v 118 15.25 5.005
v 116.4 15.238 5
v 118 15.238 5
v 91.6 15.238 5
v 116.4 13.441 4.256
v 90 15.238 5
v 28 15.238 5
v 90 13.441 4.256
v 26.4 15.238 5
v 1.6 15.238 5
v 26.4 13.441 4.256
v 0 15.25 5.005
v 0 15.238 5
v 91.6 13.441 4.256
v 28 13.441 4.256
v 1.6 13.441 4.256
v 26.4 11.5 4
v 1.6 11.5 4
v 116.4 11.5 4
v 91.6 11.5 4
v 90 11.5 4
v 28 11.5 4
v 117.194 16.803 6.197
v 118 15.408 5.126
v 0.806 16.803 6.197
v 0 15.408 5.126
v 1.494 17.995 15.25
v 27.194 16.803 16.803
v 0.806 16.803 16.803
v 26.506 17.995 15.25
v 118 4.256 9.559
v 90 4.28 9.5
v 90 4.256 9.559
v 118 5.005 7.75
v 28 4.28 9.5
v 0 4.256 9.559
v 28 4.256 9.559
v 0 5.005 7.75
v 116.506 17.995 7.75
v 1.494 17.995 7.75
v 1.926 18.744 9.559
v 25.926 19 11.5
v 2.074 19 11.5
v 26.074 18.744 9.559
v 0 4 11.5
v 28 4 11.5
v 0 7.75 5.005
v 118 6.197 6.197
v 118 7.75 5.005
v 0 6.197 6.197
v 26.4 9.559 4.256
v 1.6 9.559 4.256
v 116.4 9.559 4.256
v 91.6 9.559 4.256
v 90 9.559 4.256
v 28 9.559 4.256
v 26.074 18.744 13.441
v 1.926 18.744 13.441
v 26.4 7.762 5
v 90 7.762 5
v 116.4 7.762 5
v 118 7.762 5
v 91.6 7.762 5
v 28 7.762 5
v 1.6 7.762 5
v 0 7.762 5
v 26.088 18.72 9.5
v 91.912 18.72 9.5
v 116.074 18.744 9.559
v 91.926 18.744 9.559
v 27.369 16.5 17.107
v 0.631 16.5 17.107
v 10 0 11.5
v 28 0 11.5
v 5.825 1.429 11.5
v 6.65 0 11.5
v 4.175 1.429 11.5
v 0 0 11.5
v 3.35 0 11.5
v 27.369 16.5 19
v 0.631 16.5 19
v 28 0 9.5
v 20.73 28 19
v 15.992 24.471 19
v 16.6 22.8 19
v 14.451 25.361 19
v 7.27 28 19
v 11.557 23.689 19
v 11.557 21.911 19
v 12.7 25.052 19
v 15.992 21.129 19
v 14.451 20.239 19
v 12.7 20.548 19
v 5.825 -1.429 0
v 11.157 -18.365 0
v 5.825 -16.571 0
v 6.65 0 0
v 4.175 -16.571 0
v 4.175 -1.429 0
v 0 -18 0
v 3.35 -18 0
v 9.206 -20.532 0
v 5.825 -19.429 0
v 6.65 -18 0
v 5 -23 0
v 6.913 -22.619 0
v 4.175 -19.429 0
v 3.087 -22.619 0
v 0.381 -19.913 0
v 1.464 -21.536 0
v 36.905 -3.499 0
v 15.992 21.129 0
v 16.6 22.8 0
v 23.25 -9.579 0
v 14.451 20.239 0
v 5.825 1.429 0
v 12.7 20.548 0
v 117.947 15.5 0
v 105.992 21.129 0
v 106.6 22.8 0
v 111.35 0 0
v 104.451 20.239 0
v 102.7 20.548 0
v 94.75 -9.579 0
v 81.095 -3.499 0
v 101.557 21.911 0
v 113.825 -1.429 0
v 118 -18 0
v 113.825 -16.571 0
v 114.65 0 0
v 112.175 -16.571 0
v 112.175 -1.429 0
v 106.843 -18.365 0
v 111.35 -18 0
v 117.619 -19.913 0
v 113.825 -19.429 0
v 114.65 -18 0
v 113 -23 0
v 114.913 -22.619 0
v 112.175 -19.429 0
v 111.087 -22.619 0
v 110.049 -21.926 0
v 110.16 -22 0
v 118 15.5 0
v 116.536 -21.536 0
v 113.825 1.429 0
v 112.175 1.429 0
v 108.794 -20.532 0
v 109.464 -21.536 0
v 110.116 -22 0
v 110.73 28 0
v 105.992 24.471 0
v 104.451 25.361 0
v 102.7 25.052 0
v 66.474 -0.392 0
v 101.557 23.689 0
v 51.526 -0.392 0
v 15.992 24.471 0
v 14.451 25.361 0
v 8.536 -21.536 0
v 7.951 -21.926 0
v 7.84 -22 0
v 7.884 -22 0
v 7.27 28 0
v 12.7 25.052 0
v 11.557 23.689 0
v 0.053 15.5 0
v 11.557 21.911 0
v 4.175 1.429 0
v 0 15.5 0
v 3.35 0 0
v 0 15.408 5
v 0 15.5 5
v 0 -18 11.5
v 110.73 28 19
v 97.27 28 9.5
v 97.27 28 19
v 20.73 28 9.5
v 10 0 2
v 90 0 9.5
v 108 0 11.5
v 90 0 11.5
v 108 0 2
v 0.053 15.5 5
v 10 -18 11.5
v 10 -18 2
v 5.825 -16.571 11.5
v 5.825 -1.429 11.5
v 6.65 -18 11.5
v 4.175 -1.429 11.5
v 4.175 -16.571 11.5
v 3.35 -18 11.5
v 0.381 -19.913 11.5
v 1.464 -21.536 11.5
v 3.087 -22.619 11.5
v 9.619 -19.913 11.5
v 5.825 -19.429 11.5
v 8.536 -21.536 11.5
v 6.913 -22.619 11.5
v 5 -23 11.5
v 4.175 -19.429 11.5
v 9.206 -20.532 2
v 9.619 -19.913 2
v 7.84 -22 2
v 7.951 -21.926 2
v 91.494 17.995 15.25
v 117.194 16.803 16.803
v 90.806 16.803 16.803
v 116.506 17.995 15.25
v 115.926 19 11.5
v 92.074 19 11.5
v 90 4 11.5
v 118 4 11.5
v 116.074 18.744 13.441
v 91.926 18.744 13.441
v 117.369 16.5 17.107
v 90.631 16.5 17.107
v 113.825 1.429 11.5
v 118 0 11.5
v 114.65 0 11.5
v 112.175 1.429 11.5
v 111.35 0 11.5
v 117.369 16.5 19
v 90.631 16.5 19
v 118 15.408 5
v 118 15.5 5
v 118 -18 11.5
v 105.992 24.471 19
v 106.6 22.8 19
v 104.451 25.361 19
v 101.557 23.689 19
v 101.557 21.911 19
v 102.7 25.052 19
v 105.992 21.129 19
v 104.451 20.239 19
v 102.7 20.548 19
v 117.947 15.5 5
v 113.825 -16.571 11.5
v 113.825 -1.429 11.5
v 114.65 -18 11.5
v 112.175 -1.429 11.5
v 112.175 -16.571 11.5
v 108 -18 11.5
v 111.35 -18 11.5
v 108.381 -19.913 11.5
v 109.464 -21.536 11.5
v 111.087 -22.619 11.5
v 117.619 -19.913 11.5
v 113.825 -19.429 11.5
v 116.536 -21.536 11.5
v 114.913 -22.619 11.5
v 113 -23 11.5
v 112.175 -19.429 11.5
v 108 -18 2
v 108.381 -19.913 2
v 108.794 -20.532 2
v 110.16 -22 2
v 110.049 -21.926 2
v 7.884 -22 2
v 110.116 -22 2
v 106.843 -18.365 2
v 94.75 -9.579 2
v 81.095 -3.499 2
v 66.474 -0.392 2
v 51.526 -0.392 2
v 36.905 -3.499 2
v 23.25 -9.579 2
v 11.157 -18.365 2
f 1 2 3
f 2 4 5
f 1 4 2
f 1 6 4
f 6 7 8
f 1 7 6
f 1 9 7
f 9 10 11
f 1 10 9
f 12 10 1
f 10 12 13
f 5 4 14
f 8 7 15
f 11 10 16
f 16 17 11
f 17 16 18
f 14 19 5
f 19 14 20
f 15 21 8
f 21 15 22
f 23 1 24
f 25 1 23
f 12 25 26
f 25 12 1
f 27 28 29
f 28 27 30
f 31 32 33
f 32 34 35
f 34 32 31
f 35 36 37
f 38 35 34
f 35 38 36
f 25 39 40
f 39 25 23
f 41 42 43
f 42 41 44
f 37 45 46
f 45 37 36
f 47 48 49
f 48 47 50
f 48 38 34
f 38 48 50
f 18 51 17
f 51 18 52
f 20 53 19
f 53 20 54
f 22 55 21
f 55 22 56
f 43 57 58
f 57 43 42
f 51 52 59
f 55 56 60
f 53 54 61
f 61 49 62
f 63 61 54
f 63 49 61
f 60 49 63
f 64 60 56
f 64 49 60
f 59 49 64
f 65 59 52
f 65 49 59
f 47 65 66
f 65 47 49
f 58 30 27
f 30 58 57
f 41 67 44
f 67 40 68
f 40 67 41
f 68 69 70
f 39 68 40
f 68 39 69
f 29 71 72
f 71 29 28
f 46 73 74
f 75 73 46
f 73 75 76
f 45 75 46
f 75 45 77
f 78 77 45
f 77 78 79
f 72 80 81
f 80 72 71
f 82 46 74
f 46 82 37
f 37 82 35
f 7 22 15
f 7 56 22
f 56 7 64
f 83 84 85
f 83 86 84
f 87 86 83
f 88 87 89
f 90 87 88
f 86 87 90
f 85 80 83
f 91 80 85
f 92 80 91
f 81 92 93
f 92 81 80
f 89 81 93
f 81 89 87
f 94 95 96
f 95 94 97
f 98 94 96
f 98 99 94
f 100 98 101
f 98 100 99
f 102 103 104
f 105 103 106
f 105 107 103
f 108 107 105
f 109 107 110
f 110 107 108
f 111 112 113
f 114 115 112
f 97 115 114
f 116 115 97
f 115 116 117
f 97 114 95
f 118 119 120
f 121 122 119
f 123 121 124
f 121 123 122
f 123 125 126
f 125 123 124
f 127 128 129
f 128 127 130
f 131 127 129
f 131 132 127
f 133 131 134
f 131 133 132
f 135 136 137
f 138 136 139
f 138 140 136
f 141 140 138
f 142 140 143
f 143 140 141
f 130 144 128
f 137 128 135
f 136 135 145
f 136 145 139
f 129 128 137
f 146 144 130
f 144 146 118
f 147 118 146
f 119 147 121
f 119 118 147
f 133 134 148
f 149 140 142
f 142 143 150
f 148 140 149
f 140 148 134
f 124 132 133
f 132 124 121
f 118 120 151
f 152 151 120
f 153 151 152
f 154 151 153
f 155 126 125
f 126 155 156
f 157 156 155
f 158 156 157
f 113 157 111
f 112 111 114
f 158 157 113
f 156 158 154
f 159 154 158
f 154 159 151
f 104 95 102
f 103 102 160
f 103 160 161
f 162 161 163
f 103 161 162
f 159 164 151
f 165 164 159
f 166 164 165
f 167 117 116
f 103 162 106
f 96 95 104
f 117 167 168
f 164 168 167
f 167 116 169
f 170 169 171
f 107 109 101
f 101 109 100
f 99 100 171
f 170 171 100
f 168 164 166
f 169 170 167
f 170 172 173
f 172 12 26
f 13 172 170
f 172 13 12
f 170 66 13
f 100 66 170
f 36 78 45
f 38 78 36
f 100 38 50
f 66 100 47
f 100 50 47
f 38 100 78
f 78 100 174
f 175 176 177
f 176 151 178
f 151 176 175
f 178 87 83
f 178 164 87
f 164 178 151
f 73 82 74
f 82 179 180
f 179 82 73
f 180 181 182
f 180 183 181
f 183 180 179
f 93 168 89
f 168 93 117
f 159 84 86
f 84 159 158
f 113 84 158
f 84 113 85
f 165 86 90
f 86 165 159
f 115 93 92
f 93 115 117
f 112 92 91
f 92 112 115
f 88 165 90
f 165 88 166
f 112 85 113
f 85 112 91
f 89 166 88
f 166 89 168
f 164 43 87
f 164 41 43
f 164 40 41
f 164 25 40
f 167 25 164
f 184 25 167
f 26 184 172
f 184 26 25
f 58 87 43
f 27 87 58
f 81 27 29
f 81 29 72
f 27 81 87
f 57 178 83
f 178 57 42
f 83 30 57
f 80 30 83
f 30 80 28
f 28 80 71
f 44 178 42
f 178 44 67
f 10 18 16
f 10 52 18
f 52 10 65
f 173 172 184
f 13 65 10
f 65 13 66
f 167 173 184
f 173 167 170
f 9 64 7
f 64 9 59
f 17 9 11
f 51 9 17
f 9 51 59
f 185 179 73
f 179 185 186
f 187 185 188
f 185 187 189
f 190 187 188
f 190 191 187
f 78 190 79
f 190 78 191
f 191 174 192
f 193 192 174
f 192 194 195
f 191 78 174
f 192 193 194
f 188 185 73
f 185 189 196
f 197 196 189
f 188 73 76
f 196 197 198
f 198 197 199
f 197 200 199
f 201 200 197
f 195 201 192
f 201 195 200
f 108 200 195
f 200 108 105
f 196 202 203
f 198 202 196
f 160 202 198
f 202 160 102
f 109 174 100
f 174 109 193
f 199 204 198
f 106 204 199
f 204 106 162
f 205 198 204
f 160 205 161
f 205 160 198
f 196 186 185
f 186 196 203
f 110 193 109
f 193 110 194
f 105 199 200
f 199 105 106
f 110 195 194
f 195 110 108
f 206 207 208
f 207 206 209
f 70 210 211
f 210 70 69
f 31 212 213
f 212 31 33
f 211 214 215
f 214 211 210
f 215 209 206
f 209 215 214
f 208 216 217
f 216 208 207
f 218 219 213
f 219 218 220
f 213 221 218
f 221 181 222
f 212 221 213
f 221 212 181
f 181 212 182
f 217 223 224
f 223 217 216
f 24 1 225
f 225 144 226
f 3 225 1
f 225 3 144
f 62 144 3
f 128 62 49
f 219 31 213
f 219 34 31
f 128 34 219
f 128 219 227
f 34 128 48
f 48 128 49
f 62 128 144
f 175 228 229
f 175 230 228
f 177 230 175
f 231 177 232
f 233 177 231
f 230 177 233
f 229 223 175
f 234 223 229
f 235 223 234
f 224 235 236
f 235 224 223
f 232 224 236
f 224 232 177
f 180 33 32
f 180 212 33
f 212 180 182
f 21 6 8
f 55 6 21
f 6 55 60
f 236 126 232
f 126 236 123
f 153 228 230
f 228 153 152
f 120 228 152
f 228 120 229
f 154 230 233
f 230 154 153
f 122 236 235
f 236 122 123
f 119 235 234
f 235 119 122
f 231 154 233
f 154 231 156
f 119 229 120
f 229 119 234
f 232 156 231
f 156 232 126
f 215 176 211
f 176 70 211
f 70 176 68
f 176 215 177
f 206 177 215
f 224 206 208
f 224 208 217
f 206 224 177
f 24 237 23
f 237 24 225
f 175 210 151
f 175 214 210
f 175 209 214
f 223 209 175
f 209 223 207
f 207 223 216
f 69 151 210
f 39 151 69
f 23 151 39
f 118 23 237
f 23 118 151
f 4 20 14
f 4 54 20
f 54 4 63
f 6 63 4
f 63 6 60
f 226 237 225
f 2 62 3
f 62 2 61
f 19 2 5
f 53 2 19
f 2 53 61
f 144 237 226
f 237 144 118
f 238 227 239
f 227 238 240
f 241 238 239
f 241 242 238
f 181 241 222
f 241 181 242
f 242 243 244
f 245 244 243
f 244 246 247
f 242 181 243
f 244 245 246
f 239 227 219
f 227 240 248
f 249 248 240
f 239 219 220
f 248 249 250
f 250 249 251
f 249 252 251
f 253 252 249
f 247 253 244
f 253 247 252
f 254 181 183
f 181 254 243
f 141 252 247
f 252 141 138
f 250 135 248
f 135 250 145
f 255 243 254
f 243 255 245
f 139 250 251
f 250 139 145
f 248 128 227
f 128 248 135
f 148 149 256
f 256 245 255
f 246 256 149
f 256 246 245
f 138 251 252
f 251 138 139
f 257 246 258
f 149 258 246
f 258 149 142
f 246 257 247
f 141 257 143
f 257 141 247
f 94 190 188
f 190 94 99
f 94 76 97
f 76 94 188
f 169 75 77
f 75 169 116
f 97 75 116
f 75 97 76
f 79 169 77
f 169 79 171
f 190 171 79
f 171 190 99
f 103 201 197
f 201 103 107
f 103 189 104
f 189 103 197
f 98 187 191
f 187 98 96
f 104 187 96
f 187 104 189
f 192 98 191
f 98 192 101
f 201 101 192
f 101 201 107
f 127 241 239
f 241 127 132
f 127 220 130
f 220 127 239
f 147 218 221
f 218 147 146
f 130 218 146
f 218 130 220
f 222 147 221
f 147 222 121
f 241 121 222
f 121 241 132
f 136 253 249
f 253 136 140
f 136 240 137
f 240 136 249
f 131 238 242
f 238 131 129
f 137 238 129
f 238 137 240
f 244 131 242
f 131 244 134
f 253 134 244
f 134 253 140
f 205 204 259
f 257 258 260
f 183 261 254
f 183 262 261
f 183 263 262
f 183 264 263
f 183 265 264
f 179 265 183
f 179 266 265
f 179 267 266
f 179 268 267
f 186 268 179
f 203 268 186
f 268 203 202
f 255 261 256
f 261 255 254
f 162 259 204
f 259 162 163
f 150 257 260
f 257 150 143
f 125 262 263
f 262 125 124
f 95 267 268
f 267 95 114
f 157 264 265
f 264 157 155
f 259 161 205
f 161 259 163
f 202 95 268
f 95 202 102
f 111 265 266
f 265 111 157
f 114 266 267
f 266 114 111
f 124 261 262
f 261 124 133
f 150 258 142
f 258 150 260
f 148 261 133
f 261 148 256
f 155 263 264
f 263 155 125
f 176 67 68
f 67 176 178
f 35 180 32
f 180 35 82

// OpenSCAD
//LM8UU
d=15;
l=24;

//overall
width=28;
length=l+4;
height=d+4;

//M5 screw
d5=5.2;

//
spacing=90;

module holder()
{
	difference(){
		cube([length,width,height]);
		//bearing slot
		translate([-0.5,d/2+4,d/2+4]) rotate([0,90,0]) union() {
			cylinder(r=d/2,h=length+1);
			rotate([0,0,135]) cube([d/2,d/2,length+1]);
			rotate([0,0,180]) translate([0,-5,0]) cube([d/2+1,d/2+10,length+1]);
		}
		//mounting screw hole
		translate([length/2,width-d5,0]) cylinder(r=d5/2,h=height*3,center=true);
		//chamfers
		translate([length/2-8,width-d5+3,-0.1]) rotate([0,0,-30]) mirror([1,0,0]) translate([0,-width,0]) cube([length/2,width*2,height*1.2]);
		translate([length/2+8,width-d5+3,-0.1]) rotate([0,0,30]) translate([0,-width,0]) cube([length/2,width*2,height*1.2]);
	}
	for(i=[0,1]) {
		translate([0.8+(length-1.6)*i,d/2+4,2.5]) cube([(length-l)/2-0.4,8,5],center=true);
	}
}
module _single()
{
	holder();
}

module _double()
{
	difference() {
		for(i=[0,1]) {
			translate([i*spacing,0,0]) holder();
			translate([i*(spacing+length-10),0,0]) union() {
				translate([0,-18,0]) cube([10,18,11.5]);
				translate([5,-18,0]) cylinder(r=5,h=11.5);
			}
		}
		for(j=[0,1]) {
			translate([j*(spacing+length-10),0,0]) for(i=[0,1]) {
				translate([5,i*-18,-0.1]) cylinder(r=3.3/2,h=height);
			}
		}
	}
	difference() {
		translate([7.5,-width+6,0]) cube([length+spacing-15,width-6,2]);
		translate([(length+spacing)/2,-71.5,-0.1]) cylinder(r=71.5,h=3);
	}
	translate([length/2+d5/2,0,0]) difference(){
		cube([spacing-d5,width,height/2]);
		//bearing slot
		translate([-0.5,d/2+4,d/2+4]) rotate([0,90,0]) union() {
			cylinder(r=d/2,h=spacing+1);
			rotate([0,0,135]) cube([d/2,d/2,spacing+1]);
			rotate([0,0,180]) translate([0,-5,0]) cube([d/2+1,d/2+10,spacing+1]);
		}
	}
}

//_single();
_double();
